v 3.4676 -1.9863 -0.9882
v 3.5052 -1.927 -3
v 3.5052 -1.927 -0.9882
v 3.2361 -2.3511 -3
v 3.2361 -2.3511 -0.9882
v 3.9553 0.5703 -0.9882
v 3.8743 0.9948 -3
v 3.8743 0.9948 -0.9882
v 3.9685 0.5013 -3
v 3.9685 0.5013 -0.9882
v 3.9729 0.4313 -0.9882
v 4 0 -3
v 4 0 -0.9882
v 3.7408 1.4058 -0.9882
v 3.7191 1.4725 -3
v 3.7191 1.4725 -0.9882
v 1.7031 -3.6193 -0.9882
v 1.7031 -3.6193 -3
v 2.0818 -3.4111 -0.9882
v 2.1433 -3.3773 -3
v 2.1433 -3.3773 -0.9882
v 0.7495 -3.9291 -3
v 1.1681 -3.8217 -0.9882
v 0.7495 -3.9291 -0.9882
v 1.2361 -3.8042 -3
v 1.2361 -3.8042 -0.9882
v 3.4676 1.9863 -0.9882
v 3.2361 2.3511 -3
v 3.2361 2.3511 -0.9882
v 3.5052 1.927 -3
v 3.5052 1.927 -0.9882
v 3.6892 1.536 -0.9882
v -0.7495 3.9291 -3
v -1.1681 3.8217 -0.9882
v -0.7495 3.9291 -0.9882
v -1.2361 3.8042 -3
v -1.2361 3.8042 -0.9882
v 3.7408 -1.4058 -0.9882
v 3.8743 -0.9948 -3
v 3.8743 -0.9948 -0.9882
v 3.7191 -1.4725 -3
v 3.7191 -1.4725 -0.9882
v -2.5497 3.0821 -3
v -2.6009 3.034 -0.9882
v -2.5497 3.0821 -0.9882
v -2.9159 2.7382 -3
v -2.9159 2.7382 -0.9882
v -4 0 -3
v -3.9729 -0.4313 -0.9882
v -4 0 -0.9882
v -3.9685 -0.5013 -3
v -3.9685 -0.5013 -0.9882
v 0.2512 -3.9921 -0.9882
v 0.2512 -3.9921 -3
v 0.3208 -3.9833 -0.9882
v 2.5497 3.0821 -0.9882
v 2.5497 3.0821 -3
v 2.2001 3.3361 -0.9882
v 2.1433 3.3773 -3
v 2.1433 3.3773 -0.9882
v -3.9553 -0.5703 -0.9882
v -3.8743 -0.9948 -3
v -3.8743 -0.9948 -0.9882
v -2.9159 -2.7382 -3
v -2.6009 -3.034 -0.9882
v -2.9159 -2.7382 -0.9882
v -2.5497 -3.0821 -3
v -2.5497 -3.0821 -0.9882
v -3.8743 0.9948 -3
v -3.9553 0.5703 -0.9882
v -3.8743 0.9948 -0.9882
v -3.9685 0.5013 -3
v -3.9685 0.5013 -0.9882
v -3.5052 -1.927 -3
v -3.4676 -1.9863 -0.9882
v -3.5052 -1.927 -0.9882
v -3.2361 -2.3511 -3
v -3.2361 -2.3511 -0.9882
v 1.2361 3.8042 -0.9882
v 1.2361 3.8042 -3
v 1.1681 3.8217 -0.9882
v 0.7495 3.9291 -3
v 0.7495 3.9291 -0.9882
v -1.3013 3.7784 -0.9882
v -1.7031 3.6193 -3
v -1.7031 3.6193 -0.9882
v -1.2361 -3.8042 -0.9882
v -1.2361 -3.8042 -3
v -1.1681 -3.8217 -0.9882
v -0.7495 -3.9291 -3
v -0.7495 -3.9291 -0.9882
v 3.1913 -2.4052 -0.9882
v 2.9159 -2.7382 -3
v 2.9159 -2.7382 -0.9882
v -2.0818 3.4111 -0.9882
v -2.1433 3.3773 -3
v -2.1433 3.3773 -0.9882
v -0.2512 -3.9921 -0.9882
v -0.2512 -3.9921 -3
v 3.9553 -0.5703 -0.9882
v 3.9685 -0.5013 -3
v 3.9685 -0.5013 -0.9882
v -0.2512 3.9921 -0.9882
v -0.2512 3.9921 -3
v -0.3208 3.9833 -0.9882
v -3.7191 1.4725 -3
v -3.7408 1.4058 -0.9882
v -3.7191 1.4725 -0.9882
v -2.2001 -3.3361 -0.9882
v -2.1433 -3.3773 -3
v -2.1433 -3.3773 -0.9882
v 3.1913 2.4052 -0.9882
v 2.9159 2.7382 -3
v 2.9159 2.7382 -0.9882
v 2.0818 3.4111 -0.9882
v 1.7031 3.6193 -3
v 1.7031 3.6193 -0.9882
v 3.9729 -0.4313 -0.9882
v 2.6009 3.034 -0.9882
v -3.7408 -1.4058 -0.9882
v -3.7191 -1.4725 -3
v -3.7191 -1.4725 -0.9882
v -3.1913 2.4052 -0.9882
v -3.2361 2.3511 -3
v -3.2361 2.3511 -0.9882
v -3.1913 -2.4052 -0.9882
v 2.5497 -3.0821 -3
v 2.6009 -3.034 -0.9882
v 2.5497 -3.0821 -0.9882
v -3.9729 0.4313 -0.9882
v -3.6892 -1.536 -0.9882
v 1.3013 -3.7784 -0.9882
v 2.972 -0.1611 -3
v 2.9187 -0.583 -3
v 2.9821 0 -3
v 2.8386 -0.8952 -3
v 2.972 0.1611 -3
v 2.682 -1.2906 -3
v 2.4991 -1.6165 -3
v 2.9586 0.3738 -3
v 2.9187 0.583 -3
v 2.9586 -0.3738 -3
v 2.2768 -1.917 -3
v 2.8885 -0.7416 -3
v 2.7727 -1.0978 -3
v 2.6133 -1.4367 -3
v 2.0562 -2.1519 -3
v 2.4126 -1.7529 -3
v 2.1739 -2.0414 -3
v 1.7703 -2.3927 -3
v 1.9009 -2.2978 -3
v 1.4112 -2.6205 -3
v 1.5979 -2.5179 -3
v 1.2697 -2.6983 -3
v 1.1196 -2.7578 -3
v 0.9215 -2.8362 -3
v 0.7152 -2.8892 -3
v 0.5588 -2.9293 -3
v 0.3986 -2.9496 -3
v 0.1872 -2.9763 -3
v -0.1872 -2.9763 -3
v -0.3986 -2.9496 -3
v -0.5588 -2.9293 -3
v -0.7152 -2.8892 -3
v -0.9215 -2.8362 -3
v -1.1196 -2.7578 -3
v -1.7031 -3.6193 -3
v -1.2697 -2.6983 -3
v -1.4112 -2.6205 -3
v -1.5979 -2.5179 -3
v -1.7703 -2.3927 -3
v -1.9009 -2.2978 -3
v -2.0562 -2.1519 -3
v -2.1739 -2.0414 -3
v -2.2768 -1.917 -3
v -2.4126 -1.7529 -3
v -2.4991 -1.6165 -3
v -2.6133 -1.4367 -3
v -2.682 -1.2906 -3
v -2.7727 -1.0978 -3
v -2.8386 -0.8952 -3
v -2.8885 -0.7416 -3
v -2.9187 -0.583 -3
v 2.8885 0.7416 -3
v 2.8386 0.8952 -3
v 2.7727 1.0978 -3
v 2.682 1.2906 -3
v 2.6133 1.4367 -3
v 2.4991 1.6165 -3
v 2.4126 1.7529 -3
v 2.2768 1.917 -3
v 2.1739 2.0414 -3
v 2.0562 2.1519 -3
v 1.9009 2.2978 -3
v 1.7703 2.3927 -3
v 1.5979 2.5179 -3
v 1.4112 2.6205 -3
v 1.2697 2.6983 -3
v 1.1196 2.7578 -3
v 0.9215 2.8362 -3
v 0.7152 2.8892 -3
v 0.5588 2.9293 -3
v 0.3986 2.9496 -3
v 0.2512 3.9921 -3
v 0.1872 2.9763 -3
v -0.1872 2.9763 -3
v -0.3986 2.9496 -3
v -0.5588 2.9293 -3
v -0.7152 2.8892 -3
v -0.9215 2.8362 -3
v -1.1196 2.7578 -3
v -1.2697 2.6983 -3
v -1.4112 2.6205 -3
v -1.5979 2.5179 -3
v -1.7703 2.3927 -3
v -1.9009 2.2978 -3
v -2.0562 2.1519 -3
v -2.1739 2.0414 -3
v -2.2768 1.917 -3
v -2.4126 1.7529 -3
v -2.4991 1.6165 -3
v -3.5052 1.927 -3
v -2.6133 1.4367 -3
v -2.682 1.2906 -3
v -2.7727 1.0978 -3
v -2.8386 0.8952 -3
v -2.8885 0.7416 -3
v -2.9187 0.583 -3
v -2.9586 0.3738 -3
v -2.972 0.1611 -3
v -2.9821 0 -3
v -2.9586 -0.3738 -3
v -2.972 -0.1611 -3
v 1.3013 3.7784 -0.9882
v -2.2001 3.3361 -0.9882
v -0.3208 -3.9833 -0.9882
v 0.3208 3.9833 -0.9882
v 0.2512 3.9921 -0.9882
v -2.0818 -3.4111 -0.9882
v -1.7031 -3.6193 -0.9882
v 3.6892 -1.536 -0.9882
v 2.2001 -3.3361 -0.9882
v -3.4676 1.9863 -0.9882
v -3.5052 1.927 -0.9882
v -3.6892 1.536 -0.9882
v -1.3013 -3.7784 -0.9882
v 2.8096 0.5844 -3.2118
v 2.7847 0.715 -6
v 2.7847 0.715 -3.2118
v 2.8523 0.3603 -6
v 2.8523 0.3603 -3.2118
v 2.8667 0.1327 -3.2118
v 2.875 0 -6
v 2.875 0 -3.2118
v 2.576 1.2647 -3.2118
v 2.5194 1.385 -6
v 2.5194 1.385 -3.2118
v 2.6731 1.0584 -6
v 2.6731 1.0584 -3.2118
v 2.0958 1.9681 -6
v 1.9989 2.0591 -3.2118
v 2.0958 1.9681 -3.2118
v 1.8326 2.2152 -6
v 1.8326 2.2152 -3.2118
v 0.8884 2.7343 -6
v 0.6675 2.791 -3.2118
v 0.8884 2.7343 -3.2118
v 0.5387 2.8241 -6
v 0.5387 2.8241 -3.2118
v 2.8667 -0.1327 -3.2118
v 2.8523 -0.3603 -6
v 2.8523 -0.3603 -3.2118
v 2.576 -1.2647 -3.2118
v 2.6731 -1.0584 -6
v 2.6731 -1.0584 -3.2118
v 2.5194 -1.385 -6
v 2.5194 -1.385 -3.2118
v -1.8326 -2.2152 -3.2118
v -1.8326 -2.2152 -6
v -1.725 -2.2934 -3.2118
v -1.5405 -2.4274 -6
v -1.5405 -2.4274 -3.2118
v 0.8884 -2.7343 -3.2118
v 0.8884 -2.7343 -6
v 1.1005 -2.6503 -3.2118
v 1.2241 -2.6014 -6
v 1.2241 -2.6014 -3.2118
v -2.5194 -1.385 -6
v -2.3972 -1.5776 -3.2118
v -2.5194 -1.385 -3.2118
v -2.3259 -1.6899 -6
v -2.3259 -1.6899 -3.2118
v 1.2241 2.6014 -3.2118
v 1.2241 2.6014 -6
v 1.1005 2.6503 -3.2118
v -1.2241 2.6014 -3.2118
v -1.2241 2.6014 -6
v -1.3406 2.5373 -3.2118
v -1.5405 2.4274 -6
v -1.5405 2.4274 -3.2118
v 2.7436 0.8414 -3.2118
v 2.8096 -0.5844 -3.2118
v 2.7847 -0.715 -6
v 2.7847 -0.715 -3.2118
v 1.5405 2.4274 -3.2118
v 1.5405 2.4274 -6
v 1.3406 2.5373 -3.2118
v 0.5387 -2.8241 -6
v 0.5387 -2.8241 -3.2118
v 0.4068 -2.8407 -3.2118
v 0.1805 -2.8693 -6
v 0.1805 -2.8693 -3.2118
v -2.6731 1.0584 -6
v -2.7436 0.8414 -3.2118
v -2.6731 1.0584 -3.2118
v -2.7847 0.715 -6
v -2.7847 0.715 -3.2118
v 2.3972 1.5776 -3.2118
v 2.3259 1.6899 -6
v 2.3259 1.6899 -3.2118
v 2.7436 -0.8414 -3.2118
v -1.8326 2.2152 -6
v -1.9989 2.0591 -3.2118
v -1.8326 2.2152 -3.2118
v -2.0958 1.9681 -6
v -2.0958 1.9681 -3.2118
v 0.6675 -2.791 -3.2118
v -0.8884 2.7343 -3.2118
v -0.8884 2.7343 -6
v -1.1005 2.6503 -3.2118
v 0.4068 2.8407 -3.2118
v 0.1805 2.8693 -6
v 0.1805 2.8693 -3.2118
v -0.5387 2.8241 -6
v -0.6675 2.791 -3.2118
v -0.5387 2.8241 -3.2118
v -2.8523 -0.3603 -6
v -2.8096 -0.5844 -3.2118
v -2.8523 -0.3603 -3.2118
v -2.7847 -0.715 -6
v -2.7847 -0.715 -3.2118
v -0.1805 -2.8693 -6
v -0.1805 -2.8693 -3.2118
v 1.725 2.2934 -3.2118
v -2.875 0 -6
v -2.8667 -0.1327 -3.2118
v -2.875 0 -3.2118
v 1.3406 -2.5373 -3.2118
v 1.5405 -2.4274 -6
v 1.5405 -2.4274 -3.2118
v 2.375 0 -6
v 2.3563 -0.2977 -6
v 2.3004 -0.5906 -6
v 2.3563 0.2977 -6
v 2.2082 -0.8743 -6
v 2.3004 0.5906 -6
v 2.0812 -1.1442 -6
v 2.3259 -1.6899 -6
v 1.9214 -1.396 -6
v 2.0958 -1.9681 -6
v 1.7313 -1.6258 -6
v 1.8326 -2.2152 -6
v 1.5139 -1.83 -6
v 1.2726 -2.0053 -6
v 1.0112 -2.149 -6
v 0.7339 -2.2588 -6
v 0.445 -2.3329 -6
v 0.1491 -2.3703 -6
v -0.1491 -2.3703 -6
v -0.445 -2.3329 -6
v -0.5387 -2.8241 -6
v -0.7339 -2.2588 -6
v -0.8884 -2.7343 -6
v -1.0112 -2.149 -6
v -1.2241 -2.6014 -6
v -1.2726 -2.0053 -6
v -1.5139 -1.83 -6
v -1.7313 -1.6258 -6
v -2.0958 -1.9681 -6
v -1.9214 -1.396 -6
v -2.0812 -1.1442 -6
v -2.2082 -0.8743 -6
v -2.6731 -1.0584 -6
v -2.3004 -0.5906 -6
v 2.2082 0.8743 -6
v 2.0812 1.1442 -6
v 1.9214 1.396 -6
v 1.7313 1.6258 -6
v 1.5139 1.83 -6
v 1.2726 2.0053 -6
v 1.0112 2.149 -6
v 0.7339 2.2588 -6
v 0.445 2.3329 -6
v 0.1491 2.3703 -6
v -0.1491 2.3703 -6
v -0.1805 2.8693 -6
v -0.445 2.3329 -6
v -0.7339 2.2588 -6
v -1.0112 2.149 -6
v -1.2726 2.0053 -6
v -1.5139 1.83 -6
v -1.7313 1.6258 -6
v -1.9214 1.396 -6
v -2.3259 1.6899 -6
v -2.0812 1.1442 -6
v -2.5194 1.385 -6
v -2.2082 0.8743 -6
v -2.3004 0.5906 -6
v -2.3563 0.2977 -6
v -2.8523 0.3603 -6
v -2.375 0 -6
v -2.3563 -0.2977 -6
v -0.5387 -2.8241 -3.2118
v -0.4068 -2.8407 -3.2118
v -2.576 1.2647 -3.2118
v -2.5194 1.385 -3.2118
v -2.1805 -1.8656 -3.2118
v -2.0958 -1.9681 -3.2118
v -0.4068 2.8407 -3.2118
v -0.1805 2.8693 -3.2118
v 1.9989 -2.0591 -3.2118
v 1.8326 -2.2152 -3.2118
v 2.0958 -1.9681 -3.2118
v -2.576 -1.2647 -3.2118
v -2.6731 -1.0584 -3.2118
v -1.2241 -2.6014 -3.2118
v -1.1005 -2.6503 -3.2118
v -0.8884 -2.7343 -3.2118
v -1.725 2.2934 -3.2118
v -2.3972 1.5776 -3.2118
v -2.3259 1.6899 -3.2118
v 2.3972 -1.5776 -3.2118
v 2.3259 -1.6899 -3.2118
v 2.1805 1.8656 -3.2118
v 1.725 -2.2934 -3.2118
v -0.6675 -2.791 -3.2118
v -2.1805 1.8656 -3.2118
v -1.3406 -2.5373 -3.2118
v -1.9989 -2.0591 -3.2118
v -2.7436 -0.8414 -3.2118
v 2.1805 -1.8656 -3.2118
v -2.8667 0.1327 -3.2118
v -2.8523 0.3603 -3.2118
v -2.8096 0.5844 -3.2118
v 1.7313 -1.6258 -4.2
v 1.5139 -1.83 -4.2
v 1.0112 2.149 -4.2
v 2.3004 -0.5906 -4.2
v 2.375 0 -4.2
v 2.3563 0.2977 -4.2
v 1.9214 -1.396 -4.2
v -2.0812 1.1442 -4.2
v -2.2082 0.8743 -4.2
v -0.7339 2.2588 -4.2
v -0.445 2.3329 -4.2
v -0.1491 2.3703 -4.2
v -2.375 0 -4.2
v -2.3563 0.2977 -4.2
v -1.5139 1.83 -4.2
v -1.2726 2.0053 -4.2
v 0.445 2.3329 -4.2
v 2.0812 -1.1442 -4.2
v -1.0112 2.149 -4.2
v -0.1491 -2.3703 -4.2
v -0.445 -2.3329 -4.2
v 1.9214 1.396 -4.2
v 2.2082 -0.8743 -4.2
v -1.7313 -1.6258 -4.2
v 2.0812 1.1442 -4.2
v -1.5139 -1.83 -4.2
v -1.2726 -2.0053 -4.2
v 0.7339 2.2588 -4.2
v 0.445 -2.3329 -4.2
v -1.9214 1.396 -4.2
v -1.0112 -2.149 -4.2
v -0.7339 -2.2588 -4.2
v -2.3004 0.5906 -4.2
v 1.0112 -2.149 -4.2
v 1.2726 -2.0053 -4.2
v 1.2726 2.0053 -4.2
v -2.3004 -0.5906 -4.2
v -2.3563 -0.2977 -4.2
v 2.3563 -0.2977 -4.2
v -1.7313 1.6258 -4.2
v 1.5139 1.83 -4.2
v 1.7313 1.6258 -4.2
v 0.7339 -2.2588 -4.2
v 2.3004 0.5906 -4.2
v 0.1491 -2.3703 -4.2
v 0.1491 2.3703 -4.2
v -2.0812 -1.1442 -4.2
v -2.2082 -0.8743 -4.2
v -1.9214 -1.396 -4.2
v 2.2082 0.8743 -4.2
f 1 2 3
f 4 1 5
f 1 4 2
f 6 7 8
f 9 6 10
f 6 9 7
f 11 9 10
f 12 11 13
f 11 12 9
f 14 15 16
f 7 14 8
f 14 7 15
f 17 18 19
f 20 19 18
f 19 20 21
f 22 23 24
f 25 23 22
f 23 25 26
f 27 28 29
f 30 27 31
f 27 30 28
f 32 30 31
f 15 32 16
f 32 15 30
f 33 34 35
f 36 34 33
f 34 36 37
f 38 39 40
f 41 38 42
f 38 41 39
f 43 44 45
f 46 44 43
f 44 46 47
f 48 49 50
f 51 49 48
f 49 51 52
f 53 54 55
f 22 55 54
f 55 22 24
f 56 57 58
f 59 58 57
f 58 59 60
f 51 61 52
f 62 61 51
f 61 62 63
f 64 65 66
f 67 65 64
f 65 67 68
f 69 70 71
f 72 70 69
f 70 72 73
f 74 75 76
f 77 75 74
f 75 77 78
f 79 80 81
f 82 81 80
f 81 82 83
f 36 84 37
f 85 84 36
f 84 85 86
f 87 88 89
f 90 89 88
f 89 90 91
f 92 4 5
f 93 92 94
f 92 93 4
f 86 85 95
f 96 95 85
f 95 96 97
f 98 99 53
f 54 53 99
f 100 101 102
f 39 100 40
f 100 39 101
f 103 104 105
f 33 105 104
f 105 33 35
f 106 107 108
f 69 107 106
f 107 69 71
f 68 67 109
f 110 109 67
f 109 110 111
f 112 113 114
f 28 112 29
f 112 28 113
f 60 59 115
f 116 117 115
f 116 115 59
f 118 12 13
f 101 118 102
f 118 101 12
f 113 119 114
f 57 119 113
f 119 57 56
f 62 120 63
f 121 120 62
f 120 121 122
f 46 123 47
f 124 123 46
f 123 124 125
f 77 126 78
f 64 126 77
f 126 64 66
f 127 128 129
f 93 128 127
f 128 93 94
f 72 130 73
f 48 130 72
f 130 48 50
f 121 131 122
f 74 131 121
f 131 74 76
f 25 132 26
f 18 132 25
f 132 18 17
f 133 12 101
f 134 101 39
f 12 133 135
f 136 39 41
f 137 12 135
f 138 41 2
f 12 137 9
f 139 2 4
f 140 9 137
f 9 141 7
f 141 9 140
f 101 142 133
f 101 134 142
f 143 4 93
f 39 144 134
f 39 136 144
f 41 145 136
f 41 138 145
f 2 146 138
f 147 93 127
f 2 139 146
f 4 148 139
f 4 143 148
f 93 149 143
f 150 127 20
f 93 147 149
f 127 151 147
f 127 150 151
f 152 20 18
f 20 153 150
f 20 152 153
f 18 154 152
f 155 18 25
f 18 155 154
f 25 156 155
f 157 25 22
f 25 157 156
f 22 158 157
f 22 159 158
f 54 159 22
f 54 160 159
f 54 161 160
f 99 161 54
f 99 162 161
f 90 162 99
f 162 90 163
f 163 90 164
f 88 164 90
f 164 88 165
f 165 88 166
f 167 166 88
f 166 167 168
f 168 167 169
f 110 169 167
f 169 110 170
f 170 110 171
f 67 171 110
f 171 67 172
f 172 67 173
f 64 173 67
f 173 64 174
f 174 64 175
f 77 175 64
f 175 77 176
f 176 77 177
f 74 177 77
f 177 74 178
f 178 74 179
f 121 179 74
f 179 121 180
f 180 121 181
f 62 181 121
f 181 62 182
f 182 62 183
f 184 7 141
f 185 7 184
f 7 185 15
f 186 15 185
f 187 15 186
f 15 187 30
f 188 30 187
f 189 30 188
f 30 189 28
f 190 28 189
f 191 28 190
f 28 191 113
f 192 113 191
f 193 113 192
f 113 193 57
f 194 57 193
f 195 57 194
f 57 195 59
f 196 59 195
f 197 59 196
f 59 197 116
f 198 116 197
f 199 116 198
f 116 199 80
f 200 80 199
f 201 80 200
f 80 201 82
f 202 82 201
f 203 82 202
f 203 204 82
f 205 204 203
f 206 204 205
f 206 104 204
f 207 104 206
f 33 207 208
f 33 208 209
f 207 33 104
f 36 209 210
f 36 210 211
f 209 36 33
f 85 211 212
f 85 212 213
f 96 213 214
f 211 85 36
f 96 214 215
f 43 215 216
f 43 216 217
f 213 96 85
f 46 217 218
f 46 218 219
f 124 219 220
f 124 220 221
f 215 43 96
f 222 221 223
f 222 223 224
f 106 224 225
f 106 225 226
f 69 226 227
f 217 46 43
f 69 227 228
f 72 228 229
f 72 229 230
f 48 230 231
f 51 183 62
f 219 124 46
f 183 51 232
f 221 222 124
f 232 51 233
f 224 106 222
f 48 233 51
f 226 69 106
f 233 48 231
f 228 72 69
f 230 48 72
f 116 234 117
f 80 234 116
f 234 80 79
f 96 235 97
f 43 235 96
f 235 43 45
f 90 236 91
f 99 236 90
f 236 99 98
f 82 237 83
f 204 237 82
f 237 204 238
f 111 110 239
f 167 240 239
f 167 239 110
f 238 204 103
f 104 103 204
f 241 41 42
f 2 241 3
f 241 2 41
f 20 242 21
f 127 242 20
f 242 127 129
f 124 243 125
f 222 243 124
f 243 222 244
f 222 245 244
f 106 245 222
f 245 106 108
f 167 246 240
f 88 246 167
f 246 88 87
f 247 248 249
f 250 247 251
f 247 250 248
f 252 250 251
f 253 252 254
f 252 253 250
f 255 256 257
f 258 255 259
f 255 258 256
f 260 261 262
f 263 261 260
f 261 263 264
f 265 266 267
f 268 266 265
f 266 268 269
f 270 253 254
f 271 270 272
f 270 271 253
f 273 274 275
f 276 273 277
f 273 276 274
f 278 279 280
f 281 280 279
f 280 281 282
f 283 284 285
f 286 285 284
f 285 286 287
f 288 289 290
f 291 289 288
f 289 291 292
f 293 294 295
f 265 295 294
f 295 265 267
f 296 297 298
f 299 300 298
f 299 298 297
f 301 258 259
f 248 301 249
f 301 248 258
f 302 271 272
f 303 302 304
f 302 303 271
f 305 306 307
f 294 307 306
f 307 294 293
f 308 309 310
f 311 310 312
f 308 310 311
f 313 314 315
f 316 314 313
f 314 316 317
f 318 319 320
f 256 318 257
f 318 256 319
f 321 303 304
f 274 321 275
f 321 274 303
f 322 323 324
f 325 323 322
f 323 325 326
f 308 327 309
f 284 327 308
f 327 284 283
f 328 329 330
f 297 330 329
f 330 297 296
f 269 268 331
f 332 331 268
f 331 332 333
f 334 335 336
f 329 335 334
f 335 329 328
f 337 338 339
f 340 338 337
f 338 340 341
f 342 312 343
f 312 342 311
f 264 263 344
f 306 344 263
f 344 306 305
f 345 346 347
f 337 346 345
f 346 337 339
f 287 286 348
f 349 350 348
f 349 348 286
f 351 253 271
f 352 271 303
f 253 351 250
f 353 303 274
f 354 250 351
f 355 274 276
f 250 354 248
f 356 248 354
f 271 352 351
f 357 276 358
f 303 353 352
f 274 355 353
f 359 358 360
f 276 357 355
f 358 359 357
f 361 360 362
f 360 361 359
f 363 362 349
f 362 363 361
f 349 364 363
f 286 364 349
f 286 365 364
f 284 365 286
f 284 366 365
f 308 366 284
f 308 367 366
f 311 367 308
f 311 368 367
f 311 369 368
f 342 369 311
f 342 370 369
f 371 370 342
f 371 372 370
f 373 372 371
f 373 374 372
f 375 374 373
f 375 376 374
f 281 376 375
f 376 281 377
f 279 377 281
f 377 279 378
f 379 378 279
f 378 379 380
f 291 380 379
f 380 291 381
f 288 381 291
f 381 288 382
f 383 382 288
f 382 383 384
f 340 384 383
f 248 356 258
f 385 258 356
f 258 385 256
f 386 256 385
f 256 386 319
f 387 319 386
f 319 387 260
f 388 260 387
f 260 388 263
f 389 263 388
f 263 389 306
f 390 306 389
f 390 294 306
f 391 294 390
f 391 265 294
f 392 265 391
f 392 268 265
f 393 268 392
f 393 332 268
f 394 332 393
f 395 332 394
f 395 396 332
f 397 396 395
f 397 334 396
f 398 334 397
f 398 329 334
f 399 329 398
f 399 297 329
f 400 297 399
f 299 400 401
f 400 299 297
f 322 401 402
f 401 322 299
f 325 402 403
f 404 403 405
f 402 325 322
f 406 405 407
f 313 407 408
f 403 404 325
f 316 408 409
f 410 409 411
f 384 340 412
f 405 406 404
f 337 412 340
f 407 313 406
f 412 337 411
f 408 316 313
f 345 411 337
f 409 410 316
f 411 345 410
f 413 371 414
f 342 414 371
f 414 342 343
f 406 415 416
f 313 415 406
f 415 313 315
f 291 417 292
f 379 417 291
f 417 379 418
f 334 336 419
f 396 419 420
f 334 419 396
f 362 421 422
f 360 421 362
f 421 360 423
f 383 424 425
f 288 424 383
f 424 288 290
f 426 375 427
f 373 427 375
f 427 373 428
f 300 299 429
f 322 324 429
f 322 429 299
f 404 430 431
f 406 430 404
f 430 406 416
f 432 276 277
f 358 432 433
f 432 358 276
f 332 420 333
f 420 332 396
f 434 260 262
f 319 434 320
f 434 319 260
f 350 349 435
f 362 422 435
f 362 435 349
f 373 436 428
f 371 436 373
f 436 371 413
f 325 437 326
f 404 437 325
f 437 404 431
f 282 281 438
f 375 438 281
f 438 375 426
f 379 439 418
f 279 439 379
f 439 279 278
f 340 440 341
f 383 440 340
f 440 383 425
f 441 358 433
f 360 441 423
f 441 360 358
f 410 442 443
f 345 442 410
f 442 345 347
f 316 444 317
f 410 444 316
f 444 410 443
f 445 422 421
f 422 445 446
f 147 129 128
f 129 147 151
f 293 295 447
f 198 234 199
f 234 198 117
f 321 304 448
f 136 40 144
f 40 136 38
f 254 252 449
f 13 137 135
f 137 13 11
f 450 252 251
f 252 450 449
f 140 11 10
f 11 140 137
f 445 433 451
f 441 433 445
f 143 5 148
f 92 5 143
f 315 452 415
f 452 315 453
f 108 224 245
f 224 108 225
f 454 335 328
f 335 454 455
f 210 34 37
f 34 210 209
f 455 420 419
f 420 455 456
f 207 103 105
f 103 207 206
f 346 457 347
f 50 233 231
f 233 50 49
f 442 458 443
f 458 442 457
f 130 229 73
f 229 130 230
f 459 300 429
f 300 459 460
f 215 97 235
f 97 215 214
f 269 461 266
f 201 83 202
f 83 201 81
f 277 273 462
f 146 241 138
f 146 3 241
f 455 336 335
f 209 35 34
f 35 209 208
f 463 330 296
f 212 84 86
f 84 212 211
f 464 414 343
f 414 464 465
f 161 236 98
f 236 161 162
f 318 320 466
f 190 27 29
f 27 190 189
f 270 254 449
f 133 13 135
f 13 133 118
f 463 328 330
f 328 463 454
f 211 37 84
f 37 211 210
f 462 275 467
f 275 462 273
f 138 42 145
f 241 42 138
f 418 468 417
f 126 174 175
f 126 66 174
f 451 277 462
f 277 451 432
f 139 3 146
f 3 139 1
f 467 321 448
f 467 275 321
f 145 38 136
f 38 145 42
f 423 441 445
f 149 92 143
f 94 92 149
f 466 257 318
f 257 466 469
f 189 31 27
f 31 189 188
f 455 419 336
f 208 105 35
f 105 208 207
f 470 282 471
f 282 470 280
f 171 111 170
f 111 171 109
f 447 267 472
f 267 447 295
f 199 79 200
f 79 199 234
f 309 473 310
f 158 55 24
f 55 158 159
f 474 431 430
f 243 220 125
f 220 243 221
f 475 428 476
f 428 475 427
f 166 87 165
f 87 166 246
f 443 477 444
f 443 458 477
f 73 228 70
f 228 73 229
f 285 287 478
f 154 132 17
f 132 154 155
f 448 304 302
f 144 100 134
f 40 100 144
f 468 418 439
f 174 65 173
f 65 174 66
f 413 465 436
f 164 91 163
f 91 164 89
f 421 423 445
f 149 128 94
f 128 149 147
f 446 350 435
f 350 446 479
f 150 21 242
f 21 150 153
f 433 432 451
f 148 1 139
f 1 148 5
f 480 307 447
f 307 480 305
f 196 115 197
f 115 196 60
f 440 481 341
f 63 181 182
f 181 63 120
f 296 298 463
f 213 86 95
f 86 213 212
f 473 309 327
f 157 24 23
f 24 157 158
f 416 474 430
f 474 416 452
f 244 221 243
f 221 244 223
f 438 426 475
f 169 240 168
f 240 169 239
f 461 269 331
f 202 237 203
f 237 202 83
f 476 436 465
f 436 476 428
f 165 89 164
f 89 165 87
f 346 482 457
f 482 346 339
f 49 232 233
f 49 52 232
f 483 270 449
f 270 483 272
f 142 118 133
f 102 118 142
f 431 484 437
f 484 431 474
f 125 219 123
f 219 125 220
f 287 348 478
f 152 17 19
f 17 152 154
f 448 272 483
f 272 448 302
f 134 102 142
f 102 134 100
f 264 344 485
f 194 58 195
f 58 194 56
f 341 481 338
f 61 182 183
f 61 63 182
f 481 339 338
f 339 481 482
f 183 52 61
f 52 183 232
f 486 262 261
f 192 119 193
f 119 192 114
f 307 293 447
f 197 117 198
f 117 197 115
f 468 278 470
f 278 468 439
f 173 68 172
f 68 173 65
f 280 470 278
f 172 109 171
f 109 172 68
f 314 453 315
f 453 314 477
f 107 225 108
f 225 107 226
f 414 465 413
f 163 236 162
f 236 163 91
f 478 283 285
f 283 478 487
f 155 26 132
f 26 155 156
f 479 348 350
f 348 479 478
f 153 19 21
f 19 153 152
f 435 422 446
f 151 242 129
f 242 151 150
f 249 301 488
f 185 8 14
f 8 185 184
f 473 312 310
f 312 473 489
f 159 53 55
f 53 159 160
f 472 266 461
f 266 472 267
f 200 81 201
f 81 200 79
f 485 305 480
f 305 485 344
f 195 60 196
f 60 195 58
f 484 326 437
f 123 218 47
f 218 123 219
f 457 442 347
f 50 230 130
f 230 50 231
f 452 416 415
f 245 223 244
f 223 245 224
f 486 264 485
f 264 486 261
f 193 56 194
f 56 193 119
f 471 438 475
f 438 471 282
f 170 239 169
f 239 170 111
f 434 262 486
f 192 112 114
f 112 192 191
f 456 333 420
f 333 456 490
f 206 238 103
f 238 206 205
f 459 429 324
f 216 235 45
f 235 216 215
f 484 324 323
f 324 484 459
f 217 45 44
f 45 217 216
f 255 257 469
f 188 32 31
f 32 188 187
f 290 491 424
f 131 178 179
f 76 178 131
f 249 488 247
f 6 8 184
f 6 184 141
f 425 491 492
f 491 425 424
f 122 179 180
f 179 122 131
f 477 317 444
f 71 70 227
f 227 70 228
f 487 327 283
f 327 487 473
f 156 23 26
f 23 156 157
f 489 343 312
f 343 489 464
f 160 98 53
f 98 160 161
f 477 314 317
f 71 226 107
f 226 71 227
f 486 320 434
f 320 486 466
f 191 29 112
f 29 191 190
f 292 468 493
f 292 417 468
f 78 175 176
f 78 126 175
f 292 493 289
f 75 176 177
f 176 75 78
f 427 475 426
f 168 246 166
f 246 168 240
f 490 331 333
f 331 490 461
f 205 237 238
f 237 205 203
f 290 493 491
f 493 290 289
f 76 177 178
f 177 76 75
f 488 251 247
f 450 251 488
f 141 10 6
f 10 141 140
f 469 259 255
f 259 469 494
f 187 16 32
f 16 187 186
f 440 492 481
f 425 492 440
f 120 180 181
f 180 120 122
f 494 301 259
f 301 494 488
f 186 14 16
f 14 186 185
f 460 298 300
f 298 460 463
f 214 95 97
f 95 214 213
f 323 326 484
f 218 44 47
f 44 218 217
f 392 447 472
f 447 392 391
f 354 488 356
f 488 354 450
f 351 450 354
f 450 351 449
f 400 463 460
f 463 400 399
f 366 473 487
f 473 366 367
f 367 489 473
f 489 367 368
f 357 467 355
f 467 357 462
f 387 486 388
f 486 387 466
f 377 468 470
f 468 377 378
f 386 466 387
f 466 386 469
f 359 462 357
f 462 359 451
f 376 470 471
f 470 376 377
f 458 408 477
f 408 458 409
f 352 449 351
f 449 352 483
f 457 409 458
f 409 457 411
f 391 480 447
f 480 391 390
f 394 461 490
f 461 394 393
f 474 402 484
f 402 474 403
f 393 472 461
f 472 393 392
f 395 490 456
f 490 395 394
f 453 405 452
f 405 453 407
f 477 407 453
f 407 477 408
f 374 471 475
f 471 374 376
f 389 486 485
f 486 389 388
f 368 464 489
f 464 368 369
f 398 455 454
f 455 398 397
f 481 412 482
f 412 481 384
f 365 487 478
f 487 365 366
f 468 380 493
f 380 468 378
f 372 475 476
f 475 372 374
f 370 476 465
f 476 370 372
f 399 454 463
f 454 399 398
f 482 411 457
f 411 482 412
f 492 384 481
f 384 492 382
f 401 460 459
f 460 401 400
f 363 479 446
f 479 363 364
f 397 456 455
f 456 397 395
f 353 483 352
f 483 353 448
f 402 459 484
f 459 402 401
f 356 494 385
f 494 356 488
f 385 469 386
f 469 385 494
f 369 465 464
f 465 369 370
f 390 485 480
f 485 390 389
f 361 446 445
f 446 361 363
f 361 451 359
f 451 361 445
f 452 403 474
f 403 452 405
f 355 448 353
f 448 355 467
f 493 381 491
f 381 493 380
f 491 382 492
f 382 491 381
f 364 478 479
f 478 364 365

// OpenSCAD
$fn = 50;

difference() {
	union() {
		translate(v = [0, 0, -3.0]) {
			cylinder(h = 6, r = 4.0);
		}
		#translate(v = [0, 0, -6.0]) {
			cylinder(h = 6, r = 2.875);
		}
	}
	union() {
		translate(v = [0, 0, 0]) {
			rotate(a = [0, 0, 0]) {
				difference() {
					union() {
						translate(v = [0, 0, -6.0]) {
							cylinder(h = 6, r = 2.25);
						}
						translate(v = [0, 0, -4.2]) {
							cylinder(h = 4.2, r1 = 2.375, r2 = 4.5);
						}
						translate(v = [0, 0, -6.0]) {
							cylinder(h = 6, r = 2.375);
						}
						translate(v = [0, 0, -6.0]) {
							cylinder(h = 6, r = 2.25);
						}
					}
					union();
				}
			}
		}
		#cylinder(h = 3, r = 5.0);
	}
}
